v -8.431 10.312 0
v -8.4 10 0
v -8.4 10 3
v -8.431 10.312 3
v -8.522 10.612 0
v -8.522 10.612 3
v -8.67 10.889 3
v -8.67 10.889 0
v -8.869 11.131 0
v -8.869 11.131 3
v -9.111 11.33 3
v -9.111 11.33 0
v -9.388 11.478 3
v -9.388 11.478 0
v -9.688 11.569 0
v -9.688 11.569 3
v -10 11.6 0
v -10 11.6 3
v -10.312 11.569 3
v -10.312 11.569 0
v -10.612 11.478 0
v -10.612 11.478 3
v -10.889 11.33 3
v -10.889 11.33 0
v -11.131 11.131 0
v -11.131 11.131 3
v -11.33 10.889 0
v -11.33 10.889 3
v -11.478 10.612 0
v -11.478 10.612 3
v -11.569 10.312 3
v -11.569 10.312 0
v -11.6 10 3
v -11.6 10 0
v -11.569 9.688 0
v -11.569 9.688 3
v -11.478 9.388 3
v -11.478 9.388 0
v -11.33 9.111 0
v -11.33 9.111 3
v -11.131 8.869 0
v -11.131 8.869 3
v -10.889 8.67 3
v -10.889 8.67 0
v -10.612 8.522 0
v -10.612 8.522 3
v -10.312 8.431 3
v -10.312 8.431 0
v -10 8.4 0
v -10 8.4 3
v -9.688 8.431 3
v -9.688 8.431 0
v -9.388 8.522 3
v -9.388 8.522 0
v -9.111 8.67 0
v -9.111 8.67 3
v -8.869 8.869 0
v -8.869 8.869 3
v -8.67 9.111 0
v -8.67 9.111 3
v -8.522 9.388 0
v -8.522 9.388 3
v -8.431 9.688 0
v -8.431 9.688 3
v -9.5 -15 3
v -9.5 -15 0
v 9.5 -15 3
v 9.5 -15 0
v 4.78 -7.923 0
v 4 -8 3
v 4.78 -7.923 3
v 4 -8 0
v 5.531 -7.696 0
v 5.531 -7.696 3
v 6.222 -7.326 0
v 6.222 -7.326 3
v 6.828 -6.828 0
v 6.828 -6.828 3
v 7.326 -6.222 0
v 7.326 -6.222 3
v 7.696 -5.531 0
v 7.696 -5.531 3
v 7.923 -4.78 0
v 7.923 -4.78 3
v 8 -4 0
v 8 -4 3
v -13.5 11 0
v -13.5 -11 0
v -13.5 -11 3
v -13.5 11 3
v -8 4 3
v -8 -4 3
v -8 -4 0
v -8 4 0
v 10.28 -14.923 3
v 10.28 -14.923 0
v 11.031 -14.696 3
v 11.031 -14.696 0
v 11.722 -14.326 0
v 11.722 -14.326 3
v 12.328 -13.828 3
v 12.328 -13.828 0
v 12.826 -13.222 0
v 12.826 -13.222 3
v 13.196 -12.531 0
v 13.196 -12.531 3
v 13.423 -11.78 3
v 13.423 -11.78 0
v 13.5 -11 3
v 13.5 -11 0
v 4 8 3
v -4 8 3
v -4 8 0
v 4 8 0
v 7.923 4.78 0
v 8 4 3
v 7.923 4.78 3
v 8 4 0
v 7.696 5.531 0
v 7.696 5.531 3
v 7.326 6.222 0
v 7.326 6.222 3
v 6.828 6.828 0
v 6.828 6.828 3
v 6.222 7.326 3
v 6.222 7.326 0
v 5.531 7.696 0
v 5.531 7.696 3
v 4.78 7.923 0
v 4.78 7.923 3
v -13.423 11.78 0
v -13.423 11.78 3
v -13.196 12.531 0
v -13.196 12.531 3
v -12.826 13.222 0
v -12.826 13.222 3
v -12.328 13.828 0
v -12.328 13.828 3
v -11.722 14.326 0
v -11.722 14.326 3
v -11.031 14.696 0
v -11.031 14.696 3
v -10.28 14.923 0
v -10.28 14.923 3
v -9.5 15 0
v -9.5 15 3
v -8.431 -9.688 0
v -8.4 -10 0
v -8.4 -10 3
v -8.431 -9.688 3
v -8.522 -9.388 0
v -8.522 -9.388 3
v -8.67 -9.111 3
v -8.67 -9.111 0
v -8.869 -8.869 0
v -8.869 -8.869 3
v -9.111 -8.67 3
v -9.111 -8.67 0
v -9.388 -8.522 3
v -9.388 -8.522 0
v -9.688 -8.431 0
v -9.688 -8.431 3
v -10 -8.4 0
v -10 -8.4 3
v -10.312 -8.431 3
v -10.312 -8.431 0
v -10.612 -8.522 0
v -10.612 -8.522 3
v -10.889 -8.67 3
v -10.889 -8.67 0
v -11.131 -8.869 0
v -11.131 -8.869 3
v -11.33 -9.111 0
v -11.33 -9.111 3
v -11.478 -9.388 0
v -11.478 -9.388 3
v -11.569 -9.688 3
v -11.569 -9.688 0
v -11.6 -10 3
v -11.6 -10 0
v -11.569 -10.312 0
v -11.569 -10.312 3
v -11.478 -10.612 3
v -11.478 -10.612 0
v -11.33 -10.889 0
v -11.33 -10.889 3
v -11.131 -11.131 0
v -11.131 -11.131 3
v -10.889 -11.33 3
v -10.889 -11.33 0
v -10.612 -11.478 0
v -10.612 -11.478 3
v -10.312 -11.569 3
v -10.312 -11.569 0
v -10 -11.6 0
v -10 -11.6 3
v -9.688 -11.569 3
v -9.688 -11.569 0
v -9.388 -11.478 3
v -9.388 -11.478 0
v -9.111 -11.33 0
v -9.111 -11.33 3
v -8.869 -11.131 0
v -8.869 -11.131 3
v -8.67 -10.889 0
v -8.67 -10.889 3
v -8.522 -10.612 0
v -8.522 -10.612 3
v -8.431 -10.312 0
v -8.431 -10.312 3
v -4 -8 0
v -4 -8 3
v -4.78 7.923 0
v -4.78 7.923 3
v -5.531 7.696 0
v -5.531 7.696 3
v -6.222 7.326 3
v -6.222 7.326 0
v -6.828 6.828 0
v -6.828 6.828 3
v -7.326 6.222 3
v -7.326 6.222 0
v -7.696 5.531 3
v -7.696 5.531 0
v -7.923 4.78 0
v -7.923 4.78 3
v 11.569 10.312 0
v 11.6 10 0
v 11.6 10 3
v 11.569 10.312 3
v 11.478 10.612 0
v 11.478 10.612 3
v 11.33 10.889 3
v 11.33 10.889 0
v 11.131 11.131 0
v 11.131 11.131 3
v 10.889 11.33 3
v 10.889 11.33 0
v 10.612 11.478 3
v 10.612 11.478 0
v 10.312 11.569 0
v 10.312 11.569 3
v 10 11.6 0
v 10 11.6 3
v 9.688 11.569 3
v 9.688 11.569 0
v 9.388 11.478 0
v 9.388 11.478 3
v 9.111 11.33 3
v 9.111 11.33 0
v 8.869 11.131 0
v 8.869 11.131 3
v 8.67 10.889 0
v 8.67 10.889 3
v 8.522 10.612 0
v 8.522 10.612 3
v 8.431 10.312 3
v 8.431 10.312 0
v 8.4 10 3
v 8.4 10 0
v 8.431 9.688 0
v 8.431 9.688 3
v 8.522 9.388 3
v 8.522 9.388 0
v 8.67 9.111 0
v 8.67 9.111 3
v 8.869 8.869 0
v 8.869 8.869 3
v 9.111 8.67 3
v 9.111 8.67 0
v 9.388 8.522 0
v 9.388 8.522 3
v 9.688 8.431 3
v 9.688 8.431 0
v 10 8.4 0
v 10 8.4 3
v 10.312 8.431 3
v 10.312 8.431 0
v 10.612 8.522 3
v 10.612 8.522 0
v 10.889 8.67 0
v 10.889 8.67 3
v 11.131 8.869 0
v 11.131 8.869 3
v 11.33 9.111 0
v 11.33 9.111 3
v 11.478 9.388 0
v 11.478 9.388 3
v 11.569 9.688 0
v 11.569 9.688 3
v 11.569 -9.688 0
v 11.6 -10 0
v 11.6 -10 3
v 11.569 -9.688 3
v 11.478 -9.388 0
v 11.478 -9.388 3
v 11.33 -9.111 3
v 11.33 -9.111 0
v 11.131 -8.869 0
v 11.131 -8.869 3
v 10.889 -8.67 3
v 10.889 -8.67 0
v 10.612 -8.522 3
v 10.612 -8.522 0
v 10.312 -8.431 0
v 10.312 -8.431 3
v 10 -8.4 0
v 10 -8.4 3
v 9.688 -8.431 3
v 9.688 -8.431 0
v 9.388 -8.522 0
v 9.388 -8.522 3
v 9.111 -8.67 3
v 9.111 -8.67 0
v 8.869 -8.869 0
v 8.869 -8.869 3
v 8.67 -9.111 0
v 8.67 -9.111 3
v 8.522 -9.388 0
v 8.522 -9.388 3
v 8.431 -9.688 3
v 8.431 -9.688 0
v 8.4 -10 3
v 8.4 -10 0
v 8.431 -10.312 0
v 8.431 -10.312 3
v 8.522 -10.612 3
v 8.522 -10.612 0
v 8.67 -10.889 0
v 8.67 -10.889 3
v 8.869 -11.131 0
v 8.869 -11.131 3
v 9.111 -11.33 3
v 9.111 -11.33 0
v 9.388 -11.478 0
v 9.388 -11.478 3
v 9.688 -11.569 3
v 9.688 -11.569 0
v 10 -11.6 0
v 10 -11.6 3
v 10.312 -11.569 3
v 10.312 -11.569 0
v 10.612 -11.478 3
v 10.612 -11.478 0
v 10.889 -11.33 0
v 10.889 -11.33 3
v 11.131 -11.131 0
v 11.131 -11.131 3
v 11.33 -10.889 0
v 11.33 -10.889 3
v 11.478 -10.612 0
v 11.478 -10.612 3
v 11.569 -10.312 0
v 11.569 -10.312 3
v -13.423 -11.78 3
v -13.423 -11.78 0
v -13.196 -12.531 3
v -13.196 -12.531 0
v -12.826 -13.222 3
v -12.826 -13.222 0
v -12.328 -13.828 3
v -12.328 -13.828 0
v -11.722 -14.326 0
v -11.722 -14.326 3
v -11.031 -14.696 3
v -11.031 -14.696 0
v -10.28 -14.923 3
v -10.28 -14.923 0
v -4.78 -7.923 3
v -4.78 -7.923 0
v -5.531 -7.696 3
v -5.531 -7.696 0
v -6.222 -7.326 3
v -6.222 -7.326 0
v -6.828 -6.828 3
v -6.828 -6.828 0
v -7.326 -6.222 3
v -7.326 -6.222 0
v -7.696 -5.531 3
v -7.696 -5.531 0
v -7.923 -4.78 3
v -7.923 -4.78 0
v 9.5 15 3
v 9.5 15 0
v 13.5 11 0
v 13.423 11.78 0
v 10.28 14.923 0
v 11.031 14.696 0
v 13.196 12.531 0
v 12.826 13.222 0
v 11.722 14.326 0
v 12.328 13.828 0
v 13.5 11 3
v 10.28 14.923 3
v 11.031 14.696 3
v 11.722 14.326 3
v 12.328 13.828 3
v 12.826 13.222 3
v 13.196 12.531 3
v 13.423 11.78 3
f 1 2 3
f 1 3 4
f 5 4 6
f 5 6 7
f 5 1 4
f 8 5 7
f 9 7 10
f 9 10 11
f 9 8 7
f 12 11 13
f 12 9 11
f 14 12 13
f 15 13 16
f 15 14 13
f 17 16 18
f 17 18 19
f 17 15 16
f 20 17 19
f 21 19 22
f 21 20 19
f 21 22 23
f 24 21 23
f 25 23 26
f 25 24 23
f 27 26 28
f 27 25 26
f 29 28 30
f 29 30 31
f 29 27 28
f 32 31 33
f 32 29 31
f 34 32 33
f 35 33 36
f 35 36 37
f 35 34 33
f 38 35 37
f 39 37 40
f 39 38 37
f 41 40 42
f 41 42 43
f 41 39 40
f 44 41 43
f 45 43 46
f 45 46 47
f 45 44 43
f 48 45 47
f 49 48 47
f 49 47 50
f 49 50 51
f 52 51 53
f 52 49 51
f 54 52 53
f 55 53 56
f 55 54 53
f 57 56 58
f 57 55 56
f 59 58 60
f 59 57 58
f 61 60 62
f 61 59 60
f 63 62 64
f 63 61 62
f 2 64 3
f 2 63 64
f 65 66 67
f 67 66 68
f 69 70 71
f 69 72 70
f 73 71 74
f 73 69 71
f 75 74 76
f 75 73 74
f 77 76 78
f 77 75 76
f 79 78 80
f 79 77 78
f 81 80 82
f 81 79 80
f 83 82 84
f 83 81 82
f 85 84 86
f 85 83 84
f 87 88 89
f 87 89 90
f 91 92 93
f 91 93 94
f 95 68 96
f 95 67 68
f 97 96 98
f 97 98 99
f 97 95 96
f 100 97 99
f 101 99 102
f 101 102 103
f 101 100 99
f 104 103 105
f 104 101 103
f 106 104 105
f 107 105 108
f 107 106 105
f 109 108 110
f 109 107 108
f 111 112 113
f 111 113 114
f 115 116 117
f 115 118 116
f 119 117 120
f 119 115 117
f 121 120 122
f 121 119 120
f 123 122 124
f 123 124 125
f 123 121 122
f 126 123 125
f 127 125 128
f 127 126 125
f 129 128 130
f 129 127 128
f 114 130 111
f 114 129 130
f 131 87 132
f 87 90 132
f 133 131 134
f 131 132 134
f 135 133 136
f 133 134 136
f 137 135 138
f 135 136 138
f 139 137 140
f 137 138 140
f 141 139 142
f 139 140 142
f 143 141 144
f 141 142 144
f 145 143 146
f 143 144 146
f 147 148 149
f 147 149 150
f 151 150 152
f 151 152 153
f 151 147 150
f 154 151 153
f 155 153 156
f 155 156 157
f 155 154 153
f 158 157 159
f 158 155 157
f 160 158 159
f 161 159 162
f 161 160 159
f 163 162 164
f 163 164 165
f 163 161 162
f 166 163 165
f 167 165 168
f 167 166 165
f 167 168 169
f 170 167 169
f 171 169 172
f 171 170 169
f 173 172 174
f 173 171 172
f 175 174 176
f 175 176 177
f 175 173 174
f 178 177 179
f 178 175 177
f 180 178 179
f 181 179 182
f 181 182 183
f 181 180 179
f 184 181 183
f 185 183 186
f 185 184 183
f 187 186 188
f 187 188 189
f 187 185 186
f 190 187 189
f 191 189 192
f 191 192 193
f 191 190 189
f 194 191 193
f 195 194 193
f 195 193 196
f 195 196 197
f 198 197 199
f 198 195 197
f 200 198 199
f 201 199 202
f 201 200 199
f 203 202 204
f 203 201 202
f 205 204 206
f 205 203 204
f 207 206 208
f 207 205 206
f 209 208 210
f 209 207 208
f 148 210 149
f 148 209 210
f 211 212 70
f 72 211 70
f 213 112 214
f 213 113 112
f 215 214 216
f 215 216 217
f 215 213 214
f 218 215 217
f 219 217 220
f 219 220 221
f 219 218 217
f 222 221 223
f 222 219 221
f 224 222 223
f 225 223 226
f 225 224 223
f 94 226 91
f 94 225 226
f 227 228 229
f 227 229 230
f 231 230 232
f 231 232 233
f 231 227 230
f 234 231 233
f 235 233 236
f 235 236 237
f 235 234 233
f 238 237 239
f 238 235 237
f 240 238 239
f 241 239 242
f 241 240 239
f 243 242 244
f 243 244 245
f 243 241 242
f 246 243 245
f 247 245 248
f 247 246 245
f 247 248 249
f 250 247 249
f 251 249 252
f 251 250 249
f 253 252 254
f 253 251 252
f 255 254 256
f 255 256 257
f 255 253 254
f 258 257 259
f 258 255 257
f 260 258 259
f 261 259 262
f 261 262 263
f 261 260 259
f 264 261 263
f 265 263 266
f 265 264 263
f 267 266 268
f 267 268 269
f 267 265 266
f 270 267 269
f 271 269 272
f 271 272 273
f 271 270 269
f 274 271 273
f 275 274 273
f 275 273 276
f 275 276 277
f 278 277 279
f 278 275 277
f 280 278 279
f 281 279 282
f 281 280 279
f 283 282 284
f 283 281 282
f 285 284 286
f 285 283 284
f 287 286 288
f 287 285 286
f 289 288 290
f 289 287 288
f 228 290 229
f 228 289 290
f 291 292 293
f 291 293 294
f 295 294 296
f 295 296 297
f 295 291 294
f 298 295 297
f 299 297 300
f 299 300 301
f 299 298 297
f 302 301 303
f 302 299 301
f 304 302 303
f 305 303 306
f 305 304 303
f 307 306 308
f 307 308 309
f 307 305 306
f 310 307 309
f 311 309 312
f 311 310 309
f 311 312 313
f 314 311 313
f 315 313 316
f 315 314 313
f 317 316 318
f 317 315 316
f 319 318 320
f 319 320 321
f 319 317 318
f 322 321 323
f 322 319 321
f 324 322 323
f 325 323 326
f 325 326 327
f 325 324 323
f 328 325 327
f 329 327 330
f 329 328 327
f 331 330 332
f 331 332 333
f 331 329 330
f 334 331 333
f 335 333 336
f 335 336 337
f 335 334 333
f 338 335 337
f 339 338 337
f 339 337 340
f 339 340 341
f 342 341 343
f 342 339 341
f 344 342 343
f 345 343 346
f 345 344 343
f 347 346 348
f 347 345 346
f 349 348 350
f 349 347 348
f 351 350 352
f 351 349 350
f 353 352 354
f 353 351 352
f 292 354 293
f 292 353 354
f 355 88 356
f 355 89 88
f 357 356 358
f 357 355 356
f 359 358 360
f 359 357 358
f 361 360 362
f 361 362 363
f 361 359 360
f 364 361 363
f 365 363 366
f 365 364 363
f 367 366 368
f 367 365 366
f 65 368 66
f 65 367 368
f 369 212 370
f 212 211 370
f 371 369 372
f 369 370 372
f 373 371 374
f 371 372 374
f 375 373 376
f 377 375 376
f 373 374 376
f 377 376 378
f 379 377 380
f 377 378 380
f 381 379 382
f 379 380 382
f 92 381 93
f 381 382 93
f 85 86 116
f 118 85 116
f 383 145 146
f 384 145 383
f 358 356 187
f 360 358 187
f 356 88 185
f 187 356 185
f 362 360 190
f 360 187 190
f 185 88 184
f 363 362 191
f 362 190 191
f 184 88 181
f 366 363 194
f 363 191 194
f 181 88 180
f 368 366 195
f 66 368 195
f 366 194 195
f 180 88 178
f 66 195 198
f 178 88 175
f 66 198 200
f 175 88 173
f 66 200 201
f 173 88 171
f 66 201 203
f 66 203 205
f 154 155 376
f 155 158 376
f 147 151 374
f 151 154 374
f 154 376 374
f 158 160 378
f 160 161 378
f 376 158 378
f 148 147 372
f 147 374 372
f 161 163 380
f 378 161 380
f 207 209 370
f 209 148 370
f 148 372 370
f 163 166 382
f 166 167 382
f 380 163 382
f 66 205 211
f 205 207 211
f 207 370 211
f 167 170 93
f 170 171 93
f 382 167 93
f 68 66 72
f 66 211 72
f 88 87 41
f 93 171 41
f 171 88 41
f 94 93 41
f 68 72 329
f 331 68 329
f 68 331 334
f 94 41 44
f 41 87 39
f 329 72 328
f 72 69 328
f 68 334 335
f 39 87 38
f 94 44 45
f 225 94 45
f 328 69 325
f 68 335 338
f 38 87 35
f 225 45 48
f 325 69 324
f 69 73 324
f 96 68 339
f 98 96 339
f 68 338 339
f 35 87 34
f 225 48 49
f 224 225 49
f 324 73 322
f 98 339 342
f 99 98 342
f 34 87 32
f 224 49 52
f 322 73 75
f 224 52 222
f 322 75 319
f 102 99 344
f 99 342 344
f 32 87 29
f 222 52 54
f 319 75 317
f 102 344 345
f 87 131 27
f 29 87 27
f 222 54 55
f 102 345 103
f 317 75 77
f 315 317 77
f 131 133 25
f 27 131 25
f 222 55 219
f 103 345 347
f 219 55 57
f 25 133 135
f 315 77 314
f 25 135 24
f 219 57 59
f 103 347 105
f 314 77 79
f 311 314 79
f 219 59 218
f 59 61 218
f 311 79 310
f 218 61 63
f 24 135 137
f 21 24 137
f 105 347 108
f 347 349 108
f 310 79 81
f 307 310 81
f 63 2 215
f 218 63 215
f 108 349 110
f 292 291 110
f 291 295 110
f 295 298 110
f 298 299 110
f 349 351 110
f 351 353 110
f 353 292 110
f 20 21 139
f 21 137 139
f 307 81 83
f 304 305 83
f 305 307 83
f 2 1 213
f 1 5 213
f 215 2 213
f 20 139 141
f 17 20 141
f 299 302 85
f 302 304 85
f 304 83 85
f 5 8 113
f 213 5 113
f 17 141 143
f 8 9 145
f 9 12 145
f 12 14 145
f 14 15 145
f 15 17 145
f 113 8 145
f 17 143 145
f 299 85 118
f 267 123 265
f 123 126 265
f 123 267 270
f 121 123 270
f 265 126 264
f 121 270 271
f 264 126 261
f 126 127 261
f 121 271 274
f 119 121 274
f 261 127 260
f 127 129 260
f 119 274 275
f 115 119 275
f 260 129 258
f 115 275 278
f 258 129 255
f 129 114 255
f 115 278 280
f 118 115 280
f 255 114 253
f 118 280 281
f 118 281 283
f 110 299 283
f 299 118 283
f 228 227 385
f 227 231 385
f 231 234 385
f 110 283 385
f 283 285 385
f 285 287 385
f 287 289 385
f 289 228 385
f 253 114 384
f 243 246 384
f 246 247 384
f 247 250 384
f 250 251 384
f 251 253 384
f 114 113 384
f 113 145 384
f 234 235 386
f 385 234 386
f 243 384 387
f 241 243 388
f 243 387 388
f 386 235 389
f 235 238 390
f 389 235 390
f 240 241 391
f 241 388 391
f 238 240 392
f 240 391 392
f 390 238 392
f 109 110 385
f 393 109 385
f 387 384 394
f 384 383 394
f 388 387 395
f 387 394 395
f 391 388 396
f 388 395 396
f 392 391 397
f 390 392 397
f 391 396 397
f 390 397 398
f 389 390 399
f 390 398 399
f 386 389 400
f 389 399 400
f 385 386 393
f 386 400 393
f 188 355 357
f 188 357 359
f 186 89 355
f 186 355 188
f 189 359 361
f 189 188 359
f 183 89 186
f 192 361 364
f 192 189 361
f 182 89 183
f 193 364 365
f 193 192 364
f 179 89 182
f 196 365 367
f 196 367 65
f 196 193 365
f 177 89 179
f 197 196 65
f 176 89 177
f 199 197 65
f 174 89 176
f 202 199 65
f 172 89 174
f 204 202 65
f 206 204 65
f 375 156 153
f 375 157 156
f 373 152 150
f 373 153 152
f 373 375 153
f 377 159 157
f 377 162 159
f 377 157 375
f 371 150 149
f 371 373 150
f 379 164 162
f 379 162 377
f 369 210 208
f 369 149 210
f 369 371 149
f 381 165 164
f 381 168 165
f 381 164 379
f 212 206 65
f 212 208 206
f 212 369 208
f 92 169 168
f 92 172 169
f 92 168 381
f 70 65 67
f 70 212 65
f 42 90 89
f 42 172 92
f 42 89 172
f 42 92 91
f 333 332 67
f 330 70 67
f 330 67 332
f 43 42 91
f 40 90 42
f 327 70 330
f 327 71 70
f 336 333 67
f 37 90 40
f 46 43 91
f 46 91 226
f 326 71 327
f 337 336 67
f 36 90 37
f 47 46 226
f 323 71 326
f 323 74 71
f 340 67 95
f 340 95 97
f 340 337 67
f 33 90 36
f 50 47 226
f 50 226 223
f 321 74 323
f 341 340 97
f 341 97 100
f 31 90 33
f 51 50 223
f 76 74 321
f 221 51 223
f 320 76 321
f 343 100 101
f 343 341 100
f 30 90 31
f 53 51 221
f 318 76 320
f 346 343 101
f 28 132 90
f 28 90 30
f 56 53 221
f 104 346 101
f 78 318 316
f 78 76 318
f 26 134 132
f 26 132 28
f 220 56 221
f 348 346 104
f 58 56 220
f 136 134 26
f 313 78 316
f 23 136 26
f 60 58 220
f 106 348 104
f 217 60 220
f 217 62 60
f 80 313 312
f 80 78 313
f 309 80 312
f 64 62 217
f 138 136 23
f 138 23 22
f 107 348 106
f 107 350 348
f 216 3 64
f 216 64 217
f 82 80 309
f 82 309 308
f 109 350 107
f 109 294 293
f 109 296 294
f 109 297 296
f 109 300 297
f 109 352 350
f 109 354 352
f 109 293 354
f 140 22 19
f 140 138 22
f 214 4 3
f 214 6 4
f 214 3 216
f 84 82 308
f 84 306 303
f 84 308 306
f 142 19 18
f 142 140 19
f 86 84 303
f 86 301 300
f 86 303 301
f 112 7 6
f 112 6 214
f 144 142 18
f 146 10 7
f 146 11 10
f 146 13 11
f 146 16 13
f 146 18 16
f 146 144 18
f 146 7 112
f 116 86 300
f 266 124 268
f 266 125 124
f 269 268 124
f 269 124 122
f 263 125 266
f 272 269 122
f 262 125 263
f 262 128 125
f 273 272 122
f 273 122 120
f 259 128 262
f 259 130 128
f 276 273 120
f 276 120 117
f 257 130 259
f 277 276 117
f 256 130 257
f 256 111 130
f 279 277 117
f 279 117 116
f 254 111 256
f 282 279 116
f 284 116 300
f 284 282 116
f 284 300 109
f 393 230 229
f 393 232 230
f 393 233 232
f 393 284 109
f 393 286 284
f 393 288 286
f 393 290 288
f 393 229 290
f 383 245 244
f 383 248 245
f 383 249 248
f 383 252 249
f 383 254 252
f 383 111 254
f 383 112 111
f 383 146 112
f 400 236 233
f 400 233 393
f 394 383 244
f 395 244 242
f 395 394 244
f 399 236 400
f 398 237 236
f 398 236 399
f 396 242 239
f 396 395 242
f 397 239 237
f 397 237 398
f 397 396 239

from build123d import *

# Parameters (mm, degrees)
SKETCH_1_W          = 27
SKETCH_1_H          = 30
SKETCH_1_R          = 1.6
EXTRUDE_1_DEPTH     = 3
SKETCH_2_W          = 16
SKETCH_2_H          = 16
CUT_EXTRUDE_1_DEPTH = 4
FILLET_1_R          = 4


with BuildPart() as part:
    # 草图1 → 凸台-拉伸1 (new body)
    with BuildSketch(Plane.XY):
        Rectangle(SKETCH_1_W, SKETCH_1_H)
        with Locations((10, 10)):
            Circle(SKETCH_1_R, mode=Mode.SUBTRACT)
        with Locations((10, -10)):
            Circle(SKETCH_1_R, mode=Mode.SUBTRACT)
        with Locations((-10, -10)):
            Circle(SKETCH_1_R, mode=Mode.SUBTRACT)
        with Locations((-10, 10)):
            Circle(SKETCH_1_R, mode=Mode.SUBTRACT)
    extrude(amount=EXTRUDE_1_DEPTH)

    # 草图2 → 切除-拉伸1 (cut, through all)
    with BuildSketch(Plane.XY.offset(3)):
        Rectangle(SKETCH_2_W, SKETCH_2_H)
    extrude(amount=-CUT_EXTRUDE_1_DEPTH, mode=Mode.SUBTRACT)

    # 圆角1
    fillet_1_edges = [part.edges().sort_by_distance(p)[0] for p in [
        (8, 8, 1.5),
        (8, -8, 1.5),
        (-8, -8, 1.5),
        (-8, 8, 1.5),
        (13.5, -15, 1.5),
        (-13.5, -15, 1.5),
        (-13.5, 15, 1.5),
        (13.5, 15, 1.5),
    ]]
    fillet(fillet_1_edges, radius=FILLET_1_R)


solid = part.part
